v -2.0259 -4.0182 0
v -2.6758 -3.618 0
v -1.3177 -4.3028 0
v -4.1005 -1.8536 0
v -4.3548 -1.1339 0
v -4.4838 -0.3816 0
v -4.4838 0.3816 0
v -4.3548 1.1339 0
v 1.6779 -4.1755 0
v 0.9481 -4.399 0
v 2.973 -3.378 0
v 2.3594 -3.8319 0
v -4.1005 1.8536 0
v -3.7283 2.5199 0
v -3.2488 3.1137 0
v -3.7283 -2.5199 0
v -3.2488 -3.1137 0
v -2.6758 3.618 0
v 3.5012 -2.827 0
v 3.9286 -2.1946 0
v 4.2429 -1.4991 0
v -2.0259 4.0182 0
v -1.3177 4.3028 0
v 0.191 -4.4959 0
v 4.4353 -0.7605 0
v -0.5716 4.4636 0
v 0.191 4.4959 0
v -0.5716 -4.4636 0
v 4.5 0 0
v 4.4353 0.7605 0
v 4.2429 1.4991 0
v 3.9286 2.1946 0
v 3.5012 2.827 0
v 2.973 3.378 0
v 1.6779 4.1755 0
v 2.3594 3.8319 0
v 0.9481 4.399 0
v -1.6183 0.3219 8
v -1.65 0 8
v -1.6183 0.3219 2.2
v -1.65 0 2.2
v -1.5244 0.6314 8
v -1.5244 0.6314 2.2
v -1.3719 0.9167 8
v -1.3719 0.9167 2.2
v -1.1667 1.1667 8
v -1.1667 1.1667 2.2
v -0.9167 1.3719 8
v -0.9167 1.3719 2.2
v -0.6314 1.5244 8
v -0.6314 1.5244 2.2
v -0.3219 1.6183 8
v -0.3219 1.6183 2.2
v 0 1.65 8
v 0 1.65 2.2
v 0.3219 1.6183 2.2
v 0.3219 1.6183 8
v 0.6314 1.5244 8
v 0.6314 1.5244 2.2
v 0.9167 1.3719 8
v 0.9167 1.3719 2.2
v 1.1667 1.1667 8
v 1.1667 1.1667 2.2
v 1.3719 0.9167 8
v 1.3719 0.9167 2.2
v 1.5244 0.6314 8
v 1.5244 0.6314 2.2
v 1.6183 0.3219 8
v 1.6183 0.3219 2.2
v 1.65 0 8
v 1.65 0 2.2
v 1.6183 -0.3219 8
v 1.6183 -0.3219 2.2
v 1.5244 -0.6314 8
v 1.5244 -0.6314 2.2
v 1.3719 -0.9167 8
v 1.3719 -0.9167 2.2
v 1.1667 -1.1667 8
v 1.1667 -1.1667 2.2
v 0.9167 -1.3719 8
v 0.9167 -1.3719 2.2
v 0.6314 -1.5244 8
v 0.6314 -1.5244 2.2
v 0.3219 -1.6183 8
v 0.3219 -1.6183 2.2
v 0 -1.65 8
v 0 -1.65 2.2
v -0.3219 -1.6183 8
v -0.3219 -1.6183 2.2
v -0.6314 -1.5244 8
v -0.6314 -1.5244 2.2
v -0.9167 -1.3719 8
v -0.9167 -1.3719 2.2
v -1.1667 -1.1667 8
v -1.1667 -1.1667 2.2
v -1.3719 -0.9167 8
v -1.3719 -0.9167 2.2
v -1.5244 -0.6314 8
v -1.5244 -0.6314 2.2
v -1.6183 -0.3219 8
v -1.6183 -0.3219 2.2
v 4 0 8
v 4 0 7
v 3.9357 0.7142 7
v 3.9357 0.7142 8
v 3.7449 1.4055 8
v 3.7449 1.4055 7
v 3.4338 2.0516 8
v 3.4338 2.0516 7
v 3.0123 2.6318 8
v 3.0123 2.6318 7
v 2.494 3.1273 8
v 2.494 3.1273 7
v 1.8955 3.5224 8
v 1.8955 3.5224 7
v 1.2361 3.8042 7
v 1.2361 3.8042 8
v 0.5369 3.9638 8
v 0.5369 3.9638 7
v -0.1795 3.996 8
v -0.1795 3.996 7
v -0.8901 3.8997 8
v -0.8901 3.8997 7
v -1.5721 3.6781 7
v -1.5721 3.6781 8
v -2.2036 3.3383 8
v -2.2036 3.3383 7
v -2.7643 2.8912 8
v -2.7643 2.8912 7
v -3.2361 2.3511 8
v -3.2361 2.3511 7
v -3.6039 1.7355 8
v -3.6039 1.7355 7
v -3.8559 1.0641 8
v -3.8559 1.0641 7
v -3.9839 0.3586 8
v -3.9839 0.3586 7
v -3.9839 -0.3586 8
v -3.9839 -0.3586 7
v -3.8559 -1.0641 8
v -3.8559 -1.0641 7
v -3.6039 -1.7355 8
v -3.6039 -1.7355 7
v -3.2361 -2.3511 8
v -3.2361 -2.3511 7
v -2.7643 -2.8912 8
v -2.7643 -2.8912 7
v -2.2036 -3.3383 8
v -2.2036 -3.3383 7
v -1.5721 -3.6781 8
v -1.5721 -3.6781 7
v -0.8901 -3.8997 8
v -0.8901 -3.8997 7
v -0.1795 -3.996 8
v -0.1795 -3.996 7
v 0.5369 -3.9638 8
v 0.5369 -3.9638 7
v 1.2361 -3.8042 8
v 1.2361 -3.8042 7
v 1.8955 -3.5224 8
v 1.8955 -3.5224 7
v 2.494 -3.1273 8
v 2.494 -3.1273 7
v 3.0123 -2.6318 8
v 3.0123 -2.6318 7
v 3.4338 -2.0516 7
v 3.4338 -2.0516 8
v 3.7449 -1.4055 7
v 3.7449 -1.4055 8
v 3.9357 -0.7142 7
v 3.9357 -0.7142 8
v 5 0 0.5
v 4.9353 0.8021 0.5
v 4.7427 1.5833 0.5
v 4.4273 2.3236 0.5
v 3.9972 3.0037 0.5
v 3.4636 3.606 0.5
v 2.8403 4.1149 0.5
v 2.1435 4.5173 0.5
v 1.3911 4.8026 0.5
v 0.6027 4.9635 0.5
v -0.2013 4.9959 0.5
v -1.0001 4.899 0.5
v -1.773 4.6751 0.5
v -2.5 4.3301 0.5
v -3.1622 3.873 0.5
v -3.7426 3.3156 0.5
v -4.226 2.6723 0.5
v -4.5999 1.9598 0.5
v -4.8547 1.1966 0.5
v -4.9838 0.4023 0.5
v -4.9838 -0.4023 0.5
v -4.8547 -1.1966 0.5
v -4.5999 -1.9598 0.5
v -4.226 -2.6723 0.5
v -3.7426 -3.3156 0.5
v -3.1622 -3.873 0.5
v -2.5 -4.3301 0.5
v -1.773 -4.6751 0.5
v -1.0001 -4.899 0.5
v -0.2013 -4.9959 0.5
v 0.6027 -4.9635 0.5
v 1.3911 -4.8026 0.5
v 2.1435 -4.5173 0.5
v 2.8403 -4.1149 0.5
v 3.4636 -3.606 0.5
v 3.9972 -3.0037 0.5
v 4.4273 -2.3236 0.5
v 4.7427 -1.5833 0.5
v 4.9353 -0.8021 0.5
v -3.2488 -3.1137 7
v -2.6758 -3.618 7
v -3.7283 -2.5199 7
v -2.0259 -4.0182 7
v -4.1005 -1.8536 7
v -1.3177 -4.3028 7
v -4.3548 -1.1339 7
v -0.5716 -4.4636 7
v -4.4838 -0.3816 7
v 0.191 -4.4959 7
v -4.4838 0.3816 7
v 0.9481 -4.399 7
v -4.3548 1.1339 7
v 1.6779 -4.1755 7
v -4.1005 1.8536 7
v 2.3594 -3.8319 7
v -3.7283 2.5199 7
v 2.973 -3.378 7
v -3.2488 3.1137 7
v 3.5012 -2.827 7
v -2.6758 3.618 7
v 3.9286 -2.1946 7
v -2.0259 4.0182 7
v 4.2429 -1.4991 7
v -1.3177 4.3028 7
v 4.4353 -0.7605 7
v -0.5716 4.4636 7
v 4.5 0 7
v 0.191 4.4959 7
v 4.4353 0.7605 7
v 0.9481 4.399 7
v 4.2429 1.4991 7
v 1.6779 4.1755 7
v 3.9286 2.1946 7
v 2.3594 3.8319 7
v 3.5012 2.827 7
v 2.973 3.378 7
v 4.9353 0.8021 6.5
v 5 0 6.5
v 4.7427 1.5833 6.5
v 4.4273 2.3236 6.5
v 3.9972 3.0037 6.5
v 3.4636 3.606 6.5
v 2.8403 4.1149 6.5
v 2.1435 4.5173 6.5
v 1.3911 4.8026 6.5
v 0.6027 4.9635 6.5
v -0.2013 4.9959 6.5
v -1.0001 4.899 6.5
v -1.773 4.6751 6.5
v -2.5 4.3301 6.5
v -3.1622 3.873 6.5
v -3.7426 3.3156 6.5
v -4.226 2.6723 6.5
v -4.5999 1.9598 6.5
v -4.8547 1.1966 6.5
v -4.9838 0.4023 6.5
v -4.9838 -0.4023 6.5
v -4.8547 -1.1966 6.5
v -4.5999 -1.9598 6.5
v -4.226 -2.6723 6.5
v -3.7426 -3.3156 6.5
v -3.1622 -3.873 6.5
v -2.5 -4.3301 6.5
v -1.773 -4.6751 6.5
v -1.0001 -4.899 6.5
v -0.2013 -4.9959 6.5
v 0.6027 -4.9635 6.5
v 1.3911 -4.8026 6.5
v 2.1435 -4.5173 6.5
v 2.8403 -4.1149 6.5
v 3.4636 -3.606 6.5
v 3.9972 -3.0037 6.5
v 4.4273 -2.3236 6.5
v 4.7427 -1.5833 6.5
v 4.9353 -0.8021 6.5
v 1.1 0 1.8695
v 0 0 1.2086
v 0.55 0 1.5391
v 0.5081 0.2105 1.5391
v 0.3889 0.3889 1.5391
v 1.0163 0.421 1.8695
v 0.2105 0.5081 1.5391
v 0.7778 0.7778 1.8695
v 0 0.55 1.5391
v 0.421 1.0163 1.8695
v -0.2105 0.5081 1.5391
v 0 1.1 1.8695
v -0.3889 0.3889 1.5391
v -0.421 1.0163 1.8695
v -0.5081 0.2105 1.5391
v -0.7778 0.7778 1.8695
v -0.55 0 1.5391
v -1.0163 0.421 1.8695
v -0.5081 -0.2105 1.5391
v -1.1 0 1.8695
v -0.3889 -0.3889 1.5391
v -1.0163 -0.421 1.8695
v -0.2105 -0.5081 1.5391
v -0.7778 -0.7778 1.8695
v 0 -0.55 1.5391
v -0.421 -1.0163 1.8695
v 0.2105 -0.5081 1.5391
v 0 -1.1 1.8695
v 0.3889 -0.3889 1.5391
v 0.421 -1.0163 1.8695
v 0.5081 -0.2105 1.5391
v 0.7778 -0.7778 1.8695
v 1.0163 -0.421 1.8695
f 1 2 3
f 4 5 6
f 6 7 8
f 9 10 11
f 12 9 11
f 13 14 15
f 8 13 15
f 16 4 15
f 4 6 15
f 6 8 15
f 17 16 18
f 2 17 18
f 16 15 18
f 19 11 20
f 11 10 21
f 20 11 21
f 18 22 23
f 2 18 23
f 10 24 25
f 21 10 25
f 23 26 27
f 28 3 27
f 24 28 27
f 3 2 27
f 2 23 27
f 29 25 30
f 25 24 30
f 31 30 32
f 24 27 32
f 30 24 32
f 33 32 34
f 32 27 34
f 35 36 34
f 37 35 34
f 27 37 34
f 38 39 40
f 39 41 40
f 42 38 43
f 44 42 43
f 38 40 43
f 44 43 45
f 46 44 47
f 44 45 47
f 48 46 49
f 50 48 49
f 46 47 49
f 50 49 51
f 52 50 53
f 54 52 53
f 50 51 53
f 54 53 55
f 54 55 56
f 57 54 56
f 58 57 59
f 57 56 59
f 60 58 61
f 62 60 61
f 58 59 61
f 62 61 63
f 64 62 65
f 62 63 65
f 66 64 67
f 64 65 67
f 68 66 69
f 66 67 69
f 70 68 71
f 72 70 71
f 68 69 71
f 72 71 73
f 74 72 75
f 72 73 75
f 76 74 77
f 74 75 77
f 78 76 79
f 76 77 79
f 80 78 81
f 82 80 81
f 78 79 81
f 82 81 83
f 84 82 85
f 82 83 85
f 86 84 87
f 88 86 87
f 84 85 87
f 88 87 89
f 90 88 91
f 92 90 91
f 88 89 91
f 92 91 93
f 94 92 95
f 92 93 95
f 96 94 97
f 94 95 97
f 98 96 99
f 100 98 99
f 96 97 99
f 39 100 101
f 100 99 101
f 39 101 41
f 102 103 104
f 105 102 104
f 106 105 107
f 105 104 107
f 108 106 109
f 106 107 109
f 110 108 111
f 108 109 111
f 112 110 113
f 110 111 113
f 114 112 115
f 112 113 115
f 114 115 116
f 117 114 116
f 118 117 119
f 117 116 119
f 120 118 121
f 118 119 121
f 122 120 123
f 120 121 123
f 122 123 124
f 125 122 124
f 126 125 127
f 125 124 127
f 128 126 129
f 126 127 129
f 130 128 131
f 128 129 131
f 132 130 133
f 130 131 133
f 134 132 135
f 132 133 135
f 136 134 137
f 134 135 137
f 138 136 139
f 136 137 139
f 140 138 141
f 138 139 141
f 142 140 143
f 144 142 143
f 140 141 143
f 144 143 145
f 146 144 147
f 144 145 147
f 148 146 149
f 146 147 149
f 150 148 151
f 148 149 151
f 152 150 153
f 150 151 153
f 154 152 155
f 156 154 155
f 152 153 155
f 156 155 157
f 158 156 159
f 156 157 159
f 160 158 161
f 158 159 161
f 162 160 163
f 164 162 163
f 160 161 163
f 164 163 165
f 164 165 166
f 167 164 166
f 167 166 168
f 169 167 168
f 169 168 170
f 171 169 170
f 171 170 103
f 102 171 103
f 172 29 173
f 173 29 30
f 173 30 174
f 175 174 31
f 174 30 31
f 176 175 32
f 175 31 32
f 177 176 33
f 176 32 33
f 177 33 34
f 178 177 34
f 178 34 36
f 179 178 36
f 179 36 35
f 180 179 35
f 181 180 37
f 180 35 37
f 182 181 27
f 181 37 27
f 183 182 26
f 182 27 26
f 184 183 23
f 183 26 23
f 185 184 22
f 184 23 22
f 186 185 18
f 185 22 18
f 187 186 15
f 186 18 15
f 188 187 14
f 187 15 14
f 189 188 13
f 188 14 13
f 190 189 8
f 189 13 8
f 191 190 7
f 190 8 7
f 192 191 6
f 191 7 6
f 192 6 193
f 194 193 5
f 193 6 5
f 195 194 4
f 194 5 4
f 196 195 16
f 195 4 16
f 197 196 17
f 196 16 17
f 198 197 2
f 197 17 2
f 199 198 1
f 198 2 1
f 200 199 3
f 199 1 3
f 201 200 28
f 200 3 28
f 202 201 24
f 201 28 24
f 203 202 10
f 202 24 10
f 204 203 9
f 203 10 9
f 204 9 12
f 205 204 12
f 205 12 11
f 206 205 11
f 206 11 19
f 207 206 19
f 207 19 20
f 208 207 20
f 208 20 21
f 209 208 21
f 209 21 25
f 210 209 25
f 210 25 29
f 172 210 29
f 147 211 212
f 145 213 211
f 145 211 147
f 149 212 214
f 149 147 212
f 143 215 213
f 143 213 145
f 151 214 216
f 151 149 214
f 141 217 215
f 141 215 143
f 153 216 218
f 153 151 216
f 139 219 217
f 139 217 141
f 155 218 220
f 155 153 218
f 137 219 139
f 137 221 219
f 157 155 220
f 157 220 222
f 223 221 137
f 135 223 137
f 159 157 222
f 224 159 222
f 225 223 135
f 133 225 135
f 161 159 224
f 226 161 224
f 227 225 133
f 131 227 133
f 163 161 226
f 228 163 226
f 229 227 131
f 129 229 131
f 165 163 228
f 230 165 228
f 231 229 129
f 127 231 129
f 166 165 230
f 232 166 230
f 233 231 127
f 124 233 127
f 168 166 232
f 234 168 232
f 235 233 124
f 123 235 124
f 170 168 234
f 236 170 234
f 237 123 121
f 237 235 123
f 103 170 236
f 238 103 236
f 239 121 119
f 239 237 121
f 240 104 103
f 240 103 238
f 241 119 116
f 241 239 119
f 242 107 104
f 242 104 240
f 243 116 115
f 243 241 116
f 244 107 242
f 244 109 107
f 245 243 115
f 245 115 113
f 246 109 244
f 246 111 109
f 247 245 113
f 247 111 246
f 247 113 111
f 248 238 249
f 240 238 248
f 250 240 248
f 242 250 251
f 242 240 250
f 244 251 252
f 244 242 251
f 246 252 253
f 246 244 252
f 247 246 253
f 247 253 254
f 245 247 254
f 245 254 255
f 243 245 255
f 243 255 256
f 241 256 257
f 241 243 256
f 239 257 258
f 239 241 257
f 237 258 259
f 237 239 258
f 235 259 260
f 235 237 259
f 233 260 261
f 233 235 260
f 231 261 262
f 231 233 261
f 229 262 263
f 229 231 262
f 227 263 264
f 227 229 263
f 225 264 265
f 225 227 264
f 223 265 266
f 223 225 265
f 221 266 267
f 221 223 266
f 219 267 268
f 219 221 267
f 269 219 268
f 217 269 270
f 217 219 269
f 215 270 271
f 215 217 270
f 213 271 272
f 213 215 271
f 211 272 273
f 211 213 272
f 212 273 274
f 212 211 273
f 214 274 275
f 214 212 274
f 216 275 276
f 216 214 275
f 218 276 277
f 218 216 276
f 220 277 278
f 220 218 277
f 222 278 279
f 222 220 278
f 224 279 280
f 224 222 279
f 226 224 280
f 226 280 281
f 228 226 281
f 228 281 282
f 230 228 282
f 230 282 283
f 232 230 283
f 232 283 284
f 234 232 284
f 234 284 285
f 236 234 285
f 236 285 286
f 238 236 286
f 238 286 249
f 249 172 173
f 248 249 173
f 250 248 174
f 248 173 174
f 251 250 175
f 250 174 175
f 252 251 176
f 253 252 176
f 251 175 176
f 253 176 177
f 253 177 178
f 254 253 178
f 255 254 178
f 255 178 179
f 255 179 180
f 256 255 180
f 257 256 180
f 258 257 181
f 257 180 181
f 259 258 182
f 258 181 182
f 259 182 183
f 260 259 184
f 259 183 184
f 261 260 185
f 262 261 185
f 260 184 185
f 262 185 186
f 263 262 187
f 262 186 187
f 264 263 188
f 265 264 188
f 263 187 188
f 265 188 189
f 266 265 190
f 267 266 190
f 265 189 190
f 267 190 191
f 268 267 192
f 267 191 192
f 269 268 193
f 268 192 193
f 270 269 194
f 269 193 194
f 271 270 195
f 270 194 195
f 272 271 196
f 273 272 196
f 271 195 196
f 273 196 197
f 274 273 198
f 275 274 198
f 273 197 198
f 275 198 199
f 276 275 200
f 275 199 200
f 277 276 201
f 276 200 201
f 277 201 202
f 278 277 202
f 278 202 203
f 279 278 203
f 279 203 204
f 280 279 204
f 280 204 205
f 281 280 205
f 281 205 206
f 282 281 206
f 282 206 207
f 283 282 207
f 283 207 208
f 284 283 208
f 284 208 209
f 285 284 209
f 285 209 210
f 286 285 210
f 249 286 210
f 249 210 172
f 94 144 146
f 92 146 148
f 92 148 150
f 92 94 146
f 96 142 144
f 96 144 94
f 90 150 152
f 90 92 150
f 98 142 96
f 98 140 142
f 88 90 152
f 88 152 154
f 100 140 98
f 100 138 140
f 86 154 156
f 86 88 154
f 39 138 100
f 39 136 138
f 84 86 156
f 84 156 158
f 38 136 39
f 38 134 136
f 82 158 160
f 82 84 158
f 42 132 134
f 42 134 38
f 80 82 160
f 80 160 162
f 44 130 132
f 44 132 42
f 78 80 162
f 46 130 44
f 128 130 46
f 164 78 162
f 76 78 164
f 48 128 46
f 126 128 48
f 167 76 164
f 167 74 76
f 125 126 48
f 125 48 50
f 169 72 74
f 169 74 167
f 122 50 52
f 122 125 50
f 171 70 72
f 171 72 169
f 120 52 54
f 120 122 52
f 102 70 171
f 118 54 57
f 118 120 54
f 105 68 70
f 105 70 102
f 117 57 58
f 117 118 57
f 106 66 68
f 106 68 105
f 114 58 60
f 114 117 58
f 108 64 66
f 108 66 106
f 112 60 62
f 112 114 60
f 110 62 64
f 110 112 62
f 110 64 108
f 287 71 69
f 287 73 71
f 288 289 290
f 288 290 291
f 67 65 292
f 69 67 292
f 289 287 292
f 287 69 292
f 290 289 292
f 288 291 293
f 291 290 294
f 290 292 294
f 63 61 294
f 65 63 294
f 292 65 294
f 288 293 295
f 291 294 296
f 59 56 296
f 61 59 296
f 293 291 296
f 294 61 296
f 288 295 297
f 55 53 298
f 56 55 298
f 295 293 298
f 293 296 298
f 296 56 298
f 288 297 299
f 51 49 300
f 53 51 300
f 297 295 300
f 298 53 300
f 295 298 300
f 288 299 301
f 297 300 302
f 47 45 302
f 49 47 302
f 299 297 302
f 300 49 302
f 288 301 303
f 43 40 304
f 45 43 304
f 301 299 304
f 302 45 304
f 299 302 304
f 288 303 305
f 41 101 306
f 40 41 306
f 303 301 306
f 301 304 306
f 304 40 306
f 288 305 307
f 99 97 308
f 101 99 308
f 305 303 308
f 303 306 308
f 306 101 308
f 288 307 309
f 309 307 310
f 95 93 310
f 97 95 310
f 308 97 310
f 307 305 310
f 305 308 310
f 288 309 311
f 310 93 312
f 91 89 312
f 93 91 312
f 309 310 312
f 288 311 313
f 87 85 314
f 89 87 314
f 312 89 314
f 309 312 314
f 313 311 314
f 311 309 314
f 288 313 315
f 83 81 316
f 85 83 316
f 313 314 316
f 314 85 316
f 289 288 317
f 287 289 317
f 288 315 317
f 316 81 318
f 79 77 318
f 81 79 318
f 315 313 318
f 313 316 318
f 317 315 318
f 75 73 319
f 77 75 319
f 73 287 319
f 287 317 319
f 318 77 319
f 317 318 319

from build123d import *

# Parameters (mm, degrees)
SKETCH_1_R      = 5
EXTRUDE_1_DEPTH = 7
SKETCH_2_R      = 4
EXTRUDE_2_DEPTH = 1
M4X0_71_D       = 3.3
M4X0_71_DEPTH   = 5.8
M4X0_71_TIP     = 0.991420021
CHAMFER_1_SIZE  = 0.5


with BuildPart() as part:
    # Эскиз1 → Бобышка-Вытянуть1 (new body)
    with BuildSketch(Plane.XY):
        Circle(SKETCH_1_R)
    extrude(amount=EXTRUDE_1_DEPTH)

    # Эскиз2 → Бобышка-Вытянуть2 (add)
    with BuildSketch(Plane.XY.offset(7)):
        Circle(SKETCH_2_R)
    extrude(amount=EXTRUDE_2_DEPTH)

    # Отверстие обработанное метчиком M4x0.71
    with Locations(Plane.XY.offset(8)):
        with Locations((0, 0)):
            Hole(M4X0_71_D / 2, depth=M4X0_71_DEPTH)
            with Locations((0, 0, -(M4X0_71_DEPTH + M4X0_71_TIP / 2))):  # 118° drill point
                Cone(0, M4X0_71_D / 2, M4X0_71_TIP, mode=Mode.SUBTRACT)

    # Фаска1
    chamfer_1_edges = [part.edges().sort_by_distance(p)[0] for p in [
        (-5, 0, 0),
        (-5, 0, 7),
    ]]
    chamfer(chamfer_1_edges, length=CHAMFER_1_SIZE)


solid = part.part
